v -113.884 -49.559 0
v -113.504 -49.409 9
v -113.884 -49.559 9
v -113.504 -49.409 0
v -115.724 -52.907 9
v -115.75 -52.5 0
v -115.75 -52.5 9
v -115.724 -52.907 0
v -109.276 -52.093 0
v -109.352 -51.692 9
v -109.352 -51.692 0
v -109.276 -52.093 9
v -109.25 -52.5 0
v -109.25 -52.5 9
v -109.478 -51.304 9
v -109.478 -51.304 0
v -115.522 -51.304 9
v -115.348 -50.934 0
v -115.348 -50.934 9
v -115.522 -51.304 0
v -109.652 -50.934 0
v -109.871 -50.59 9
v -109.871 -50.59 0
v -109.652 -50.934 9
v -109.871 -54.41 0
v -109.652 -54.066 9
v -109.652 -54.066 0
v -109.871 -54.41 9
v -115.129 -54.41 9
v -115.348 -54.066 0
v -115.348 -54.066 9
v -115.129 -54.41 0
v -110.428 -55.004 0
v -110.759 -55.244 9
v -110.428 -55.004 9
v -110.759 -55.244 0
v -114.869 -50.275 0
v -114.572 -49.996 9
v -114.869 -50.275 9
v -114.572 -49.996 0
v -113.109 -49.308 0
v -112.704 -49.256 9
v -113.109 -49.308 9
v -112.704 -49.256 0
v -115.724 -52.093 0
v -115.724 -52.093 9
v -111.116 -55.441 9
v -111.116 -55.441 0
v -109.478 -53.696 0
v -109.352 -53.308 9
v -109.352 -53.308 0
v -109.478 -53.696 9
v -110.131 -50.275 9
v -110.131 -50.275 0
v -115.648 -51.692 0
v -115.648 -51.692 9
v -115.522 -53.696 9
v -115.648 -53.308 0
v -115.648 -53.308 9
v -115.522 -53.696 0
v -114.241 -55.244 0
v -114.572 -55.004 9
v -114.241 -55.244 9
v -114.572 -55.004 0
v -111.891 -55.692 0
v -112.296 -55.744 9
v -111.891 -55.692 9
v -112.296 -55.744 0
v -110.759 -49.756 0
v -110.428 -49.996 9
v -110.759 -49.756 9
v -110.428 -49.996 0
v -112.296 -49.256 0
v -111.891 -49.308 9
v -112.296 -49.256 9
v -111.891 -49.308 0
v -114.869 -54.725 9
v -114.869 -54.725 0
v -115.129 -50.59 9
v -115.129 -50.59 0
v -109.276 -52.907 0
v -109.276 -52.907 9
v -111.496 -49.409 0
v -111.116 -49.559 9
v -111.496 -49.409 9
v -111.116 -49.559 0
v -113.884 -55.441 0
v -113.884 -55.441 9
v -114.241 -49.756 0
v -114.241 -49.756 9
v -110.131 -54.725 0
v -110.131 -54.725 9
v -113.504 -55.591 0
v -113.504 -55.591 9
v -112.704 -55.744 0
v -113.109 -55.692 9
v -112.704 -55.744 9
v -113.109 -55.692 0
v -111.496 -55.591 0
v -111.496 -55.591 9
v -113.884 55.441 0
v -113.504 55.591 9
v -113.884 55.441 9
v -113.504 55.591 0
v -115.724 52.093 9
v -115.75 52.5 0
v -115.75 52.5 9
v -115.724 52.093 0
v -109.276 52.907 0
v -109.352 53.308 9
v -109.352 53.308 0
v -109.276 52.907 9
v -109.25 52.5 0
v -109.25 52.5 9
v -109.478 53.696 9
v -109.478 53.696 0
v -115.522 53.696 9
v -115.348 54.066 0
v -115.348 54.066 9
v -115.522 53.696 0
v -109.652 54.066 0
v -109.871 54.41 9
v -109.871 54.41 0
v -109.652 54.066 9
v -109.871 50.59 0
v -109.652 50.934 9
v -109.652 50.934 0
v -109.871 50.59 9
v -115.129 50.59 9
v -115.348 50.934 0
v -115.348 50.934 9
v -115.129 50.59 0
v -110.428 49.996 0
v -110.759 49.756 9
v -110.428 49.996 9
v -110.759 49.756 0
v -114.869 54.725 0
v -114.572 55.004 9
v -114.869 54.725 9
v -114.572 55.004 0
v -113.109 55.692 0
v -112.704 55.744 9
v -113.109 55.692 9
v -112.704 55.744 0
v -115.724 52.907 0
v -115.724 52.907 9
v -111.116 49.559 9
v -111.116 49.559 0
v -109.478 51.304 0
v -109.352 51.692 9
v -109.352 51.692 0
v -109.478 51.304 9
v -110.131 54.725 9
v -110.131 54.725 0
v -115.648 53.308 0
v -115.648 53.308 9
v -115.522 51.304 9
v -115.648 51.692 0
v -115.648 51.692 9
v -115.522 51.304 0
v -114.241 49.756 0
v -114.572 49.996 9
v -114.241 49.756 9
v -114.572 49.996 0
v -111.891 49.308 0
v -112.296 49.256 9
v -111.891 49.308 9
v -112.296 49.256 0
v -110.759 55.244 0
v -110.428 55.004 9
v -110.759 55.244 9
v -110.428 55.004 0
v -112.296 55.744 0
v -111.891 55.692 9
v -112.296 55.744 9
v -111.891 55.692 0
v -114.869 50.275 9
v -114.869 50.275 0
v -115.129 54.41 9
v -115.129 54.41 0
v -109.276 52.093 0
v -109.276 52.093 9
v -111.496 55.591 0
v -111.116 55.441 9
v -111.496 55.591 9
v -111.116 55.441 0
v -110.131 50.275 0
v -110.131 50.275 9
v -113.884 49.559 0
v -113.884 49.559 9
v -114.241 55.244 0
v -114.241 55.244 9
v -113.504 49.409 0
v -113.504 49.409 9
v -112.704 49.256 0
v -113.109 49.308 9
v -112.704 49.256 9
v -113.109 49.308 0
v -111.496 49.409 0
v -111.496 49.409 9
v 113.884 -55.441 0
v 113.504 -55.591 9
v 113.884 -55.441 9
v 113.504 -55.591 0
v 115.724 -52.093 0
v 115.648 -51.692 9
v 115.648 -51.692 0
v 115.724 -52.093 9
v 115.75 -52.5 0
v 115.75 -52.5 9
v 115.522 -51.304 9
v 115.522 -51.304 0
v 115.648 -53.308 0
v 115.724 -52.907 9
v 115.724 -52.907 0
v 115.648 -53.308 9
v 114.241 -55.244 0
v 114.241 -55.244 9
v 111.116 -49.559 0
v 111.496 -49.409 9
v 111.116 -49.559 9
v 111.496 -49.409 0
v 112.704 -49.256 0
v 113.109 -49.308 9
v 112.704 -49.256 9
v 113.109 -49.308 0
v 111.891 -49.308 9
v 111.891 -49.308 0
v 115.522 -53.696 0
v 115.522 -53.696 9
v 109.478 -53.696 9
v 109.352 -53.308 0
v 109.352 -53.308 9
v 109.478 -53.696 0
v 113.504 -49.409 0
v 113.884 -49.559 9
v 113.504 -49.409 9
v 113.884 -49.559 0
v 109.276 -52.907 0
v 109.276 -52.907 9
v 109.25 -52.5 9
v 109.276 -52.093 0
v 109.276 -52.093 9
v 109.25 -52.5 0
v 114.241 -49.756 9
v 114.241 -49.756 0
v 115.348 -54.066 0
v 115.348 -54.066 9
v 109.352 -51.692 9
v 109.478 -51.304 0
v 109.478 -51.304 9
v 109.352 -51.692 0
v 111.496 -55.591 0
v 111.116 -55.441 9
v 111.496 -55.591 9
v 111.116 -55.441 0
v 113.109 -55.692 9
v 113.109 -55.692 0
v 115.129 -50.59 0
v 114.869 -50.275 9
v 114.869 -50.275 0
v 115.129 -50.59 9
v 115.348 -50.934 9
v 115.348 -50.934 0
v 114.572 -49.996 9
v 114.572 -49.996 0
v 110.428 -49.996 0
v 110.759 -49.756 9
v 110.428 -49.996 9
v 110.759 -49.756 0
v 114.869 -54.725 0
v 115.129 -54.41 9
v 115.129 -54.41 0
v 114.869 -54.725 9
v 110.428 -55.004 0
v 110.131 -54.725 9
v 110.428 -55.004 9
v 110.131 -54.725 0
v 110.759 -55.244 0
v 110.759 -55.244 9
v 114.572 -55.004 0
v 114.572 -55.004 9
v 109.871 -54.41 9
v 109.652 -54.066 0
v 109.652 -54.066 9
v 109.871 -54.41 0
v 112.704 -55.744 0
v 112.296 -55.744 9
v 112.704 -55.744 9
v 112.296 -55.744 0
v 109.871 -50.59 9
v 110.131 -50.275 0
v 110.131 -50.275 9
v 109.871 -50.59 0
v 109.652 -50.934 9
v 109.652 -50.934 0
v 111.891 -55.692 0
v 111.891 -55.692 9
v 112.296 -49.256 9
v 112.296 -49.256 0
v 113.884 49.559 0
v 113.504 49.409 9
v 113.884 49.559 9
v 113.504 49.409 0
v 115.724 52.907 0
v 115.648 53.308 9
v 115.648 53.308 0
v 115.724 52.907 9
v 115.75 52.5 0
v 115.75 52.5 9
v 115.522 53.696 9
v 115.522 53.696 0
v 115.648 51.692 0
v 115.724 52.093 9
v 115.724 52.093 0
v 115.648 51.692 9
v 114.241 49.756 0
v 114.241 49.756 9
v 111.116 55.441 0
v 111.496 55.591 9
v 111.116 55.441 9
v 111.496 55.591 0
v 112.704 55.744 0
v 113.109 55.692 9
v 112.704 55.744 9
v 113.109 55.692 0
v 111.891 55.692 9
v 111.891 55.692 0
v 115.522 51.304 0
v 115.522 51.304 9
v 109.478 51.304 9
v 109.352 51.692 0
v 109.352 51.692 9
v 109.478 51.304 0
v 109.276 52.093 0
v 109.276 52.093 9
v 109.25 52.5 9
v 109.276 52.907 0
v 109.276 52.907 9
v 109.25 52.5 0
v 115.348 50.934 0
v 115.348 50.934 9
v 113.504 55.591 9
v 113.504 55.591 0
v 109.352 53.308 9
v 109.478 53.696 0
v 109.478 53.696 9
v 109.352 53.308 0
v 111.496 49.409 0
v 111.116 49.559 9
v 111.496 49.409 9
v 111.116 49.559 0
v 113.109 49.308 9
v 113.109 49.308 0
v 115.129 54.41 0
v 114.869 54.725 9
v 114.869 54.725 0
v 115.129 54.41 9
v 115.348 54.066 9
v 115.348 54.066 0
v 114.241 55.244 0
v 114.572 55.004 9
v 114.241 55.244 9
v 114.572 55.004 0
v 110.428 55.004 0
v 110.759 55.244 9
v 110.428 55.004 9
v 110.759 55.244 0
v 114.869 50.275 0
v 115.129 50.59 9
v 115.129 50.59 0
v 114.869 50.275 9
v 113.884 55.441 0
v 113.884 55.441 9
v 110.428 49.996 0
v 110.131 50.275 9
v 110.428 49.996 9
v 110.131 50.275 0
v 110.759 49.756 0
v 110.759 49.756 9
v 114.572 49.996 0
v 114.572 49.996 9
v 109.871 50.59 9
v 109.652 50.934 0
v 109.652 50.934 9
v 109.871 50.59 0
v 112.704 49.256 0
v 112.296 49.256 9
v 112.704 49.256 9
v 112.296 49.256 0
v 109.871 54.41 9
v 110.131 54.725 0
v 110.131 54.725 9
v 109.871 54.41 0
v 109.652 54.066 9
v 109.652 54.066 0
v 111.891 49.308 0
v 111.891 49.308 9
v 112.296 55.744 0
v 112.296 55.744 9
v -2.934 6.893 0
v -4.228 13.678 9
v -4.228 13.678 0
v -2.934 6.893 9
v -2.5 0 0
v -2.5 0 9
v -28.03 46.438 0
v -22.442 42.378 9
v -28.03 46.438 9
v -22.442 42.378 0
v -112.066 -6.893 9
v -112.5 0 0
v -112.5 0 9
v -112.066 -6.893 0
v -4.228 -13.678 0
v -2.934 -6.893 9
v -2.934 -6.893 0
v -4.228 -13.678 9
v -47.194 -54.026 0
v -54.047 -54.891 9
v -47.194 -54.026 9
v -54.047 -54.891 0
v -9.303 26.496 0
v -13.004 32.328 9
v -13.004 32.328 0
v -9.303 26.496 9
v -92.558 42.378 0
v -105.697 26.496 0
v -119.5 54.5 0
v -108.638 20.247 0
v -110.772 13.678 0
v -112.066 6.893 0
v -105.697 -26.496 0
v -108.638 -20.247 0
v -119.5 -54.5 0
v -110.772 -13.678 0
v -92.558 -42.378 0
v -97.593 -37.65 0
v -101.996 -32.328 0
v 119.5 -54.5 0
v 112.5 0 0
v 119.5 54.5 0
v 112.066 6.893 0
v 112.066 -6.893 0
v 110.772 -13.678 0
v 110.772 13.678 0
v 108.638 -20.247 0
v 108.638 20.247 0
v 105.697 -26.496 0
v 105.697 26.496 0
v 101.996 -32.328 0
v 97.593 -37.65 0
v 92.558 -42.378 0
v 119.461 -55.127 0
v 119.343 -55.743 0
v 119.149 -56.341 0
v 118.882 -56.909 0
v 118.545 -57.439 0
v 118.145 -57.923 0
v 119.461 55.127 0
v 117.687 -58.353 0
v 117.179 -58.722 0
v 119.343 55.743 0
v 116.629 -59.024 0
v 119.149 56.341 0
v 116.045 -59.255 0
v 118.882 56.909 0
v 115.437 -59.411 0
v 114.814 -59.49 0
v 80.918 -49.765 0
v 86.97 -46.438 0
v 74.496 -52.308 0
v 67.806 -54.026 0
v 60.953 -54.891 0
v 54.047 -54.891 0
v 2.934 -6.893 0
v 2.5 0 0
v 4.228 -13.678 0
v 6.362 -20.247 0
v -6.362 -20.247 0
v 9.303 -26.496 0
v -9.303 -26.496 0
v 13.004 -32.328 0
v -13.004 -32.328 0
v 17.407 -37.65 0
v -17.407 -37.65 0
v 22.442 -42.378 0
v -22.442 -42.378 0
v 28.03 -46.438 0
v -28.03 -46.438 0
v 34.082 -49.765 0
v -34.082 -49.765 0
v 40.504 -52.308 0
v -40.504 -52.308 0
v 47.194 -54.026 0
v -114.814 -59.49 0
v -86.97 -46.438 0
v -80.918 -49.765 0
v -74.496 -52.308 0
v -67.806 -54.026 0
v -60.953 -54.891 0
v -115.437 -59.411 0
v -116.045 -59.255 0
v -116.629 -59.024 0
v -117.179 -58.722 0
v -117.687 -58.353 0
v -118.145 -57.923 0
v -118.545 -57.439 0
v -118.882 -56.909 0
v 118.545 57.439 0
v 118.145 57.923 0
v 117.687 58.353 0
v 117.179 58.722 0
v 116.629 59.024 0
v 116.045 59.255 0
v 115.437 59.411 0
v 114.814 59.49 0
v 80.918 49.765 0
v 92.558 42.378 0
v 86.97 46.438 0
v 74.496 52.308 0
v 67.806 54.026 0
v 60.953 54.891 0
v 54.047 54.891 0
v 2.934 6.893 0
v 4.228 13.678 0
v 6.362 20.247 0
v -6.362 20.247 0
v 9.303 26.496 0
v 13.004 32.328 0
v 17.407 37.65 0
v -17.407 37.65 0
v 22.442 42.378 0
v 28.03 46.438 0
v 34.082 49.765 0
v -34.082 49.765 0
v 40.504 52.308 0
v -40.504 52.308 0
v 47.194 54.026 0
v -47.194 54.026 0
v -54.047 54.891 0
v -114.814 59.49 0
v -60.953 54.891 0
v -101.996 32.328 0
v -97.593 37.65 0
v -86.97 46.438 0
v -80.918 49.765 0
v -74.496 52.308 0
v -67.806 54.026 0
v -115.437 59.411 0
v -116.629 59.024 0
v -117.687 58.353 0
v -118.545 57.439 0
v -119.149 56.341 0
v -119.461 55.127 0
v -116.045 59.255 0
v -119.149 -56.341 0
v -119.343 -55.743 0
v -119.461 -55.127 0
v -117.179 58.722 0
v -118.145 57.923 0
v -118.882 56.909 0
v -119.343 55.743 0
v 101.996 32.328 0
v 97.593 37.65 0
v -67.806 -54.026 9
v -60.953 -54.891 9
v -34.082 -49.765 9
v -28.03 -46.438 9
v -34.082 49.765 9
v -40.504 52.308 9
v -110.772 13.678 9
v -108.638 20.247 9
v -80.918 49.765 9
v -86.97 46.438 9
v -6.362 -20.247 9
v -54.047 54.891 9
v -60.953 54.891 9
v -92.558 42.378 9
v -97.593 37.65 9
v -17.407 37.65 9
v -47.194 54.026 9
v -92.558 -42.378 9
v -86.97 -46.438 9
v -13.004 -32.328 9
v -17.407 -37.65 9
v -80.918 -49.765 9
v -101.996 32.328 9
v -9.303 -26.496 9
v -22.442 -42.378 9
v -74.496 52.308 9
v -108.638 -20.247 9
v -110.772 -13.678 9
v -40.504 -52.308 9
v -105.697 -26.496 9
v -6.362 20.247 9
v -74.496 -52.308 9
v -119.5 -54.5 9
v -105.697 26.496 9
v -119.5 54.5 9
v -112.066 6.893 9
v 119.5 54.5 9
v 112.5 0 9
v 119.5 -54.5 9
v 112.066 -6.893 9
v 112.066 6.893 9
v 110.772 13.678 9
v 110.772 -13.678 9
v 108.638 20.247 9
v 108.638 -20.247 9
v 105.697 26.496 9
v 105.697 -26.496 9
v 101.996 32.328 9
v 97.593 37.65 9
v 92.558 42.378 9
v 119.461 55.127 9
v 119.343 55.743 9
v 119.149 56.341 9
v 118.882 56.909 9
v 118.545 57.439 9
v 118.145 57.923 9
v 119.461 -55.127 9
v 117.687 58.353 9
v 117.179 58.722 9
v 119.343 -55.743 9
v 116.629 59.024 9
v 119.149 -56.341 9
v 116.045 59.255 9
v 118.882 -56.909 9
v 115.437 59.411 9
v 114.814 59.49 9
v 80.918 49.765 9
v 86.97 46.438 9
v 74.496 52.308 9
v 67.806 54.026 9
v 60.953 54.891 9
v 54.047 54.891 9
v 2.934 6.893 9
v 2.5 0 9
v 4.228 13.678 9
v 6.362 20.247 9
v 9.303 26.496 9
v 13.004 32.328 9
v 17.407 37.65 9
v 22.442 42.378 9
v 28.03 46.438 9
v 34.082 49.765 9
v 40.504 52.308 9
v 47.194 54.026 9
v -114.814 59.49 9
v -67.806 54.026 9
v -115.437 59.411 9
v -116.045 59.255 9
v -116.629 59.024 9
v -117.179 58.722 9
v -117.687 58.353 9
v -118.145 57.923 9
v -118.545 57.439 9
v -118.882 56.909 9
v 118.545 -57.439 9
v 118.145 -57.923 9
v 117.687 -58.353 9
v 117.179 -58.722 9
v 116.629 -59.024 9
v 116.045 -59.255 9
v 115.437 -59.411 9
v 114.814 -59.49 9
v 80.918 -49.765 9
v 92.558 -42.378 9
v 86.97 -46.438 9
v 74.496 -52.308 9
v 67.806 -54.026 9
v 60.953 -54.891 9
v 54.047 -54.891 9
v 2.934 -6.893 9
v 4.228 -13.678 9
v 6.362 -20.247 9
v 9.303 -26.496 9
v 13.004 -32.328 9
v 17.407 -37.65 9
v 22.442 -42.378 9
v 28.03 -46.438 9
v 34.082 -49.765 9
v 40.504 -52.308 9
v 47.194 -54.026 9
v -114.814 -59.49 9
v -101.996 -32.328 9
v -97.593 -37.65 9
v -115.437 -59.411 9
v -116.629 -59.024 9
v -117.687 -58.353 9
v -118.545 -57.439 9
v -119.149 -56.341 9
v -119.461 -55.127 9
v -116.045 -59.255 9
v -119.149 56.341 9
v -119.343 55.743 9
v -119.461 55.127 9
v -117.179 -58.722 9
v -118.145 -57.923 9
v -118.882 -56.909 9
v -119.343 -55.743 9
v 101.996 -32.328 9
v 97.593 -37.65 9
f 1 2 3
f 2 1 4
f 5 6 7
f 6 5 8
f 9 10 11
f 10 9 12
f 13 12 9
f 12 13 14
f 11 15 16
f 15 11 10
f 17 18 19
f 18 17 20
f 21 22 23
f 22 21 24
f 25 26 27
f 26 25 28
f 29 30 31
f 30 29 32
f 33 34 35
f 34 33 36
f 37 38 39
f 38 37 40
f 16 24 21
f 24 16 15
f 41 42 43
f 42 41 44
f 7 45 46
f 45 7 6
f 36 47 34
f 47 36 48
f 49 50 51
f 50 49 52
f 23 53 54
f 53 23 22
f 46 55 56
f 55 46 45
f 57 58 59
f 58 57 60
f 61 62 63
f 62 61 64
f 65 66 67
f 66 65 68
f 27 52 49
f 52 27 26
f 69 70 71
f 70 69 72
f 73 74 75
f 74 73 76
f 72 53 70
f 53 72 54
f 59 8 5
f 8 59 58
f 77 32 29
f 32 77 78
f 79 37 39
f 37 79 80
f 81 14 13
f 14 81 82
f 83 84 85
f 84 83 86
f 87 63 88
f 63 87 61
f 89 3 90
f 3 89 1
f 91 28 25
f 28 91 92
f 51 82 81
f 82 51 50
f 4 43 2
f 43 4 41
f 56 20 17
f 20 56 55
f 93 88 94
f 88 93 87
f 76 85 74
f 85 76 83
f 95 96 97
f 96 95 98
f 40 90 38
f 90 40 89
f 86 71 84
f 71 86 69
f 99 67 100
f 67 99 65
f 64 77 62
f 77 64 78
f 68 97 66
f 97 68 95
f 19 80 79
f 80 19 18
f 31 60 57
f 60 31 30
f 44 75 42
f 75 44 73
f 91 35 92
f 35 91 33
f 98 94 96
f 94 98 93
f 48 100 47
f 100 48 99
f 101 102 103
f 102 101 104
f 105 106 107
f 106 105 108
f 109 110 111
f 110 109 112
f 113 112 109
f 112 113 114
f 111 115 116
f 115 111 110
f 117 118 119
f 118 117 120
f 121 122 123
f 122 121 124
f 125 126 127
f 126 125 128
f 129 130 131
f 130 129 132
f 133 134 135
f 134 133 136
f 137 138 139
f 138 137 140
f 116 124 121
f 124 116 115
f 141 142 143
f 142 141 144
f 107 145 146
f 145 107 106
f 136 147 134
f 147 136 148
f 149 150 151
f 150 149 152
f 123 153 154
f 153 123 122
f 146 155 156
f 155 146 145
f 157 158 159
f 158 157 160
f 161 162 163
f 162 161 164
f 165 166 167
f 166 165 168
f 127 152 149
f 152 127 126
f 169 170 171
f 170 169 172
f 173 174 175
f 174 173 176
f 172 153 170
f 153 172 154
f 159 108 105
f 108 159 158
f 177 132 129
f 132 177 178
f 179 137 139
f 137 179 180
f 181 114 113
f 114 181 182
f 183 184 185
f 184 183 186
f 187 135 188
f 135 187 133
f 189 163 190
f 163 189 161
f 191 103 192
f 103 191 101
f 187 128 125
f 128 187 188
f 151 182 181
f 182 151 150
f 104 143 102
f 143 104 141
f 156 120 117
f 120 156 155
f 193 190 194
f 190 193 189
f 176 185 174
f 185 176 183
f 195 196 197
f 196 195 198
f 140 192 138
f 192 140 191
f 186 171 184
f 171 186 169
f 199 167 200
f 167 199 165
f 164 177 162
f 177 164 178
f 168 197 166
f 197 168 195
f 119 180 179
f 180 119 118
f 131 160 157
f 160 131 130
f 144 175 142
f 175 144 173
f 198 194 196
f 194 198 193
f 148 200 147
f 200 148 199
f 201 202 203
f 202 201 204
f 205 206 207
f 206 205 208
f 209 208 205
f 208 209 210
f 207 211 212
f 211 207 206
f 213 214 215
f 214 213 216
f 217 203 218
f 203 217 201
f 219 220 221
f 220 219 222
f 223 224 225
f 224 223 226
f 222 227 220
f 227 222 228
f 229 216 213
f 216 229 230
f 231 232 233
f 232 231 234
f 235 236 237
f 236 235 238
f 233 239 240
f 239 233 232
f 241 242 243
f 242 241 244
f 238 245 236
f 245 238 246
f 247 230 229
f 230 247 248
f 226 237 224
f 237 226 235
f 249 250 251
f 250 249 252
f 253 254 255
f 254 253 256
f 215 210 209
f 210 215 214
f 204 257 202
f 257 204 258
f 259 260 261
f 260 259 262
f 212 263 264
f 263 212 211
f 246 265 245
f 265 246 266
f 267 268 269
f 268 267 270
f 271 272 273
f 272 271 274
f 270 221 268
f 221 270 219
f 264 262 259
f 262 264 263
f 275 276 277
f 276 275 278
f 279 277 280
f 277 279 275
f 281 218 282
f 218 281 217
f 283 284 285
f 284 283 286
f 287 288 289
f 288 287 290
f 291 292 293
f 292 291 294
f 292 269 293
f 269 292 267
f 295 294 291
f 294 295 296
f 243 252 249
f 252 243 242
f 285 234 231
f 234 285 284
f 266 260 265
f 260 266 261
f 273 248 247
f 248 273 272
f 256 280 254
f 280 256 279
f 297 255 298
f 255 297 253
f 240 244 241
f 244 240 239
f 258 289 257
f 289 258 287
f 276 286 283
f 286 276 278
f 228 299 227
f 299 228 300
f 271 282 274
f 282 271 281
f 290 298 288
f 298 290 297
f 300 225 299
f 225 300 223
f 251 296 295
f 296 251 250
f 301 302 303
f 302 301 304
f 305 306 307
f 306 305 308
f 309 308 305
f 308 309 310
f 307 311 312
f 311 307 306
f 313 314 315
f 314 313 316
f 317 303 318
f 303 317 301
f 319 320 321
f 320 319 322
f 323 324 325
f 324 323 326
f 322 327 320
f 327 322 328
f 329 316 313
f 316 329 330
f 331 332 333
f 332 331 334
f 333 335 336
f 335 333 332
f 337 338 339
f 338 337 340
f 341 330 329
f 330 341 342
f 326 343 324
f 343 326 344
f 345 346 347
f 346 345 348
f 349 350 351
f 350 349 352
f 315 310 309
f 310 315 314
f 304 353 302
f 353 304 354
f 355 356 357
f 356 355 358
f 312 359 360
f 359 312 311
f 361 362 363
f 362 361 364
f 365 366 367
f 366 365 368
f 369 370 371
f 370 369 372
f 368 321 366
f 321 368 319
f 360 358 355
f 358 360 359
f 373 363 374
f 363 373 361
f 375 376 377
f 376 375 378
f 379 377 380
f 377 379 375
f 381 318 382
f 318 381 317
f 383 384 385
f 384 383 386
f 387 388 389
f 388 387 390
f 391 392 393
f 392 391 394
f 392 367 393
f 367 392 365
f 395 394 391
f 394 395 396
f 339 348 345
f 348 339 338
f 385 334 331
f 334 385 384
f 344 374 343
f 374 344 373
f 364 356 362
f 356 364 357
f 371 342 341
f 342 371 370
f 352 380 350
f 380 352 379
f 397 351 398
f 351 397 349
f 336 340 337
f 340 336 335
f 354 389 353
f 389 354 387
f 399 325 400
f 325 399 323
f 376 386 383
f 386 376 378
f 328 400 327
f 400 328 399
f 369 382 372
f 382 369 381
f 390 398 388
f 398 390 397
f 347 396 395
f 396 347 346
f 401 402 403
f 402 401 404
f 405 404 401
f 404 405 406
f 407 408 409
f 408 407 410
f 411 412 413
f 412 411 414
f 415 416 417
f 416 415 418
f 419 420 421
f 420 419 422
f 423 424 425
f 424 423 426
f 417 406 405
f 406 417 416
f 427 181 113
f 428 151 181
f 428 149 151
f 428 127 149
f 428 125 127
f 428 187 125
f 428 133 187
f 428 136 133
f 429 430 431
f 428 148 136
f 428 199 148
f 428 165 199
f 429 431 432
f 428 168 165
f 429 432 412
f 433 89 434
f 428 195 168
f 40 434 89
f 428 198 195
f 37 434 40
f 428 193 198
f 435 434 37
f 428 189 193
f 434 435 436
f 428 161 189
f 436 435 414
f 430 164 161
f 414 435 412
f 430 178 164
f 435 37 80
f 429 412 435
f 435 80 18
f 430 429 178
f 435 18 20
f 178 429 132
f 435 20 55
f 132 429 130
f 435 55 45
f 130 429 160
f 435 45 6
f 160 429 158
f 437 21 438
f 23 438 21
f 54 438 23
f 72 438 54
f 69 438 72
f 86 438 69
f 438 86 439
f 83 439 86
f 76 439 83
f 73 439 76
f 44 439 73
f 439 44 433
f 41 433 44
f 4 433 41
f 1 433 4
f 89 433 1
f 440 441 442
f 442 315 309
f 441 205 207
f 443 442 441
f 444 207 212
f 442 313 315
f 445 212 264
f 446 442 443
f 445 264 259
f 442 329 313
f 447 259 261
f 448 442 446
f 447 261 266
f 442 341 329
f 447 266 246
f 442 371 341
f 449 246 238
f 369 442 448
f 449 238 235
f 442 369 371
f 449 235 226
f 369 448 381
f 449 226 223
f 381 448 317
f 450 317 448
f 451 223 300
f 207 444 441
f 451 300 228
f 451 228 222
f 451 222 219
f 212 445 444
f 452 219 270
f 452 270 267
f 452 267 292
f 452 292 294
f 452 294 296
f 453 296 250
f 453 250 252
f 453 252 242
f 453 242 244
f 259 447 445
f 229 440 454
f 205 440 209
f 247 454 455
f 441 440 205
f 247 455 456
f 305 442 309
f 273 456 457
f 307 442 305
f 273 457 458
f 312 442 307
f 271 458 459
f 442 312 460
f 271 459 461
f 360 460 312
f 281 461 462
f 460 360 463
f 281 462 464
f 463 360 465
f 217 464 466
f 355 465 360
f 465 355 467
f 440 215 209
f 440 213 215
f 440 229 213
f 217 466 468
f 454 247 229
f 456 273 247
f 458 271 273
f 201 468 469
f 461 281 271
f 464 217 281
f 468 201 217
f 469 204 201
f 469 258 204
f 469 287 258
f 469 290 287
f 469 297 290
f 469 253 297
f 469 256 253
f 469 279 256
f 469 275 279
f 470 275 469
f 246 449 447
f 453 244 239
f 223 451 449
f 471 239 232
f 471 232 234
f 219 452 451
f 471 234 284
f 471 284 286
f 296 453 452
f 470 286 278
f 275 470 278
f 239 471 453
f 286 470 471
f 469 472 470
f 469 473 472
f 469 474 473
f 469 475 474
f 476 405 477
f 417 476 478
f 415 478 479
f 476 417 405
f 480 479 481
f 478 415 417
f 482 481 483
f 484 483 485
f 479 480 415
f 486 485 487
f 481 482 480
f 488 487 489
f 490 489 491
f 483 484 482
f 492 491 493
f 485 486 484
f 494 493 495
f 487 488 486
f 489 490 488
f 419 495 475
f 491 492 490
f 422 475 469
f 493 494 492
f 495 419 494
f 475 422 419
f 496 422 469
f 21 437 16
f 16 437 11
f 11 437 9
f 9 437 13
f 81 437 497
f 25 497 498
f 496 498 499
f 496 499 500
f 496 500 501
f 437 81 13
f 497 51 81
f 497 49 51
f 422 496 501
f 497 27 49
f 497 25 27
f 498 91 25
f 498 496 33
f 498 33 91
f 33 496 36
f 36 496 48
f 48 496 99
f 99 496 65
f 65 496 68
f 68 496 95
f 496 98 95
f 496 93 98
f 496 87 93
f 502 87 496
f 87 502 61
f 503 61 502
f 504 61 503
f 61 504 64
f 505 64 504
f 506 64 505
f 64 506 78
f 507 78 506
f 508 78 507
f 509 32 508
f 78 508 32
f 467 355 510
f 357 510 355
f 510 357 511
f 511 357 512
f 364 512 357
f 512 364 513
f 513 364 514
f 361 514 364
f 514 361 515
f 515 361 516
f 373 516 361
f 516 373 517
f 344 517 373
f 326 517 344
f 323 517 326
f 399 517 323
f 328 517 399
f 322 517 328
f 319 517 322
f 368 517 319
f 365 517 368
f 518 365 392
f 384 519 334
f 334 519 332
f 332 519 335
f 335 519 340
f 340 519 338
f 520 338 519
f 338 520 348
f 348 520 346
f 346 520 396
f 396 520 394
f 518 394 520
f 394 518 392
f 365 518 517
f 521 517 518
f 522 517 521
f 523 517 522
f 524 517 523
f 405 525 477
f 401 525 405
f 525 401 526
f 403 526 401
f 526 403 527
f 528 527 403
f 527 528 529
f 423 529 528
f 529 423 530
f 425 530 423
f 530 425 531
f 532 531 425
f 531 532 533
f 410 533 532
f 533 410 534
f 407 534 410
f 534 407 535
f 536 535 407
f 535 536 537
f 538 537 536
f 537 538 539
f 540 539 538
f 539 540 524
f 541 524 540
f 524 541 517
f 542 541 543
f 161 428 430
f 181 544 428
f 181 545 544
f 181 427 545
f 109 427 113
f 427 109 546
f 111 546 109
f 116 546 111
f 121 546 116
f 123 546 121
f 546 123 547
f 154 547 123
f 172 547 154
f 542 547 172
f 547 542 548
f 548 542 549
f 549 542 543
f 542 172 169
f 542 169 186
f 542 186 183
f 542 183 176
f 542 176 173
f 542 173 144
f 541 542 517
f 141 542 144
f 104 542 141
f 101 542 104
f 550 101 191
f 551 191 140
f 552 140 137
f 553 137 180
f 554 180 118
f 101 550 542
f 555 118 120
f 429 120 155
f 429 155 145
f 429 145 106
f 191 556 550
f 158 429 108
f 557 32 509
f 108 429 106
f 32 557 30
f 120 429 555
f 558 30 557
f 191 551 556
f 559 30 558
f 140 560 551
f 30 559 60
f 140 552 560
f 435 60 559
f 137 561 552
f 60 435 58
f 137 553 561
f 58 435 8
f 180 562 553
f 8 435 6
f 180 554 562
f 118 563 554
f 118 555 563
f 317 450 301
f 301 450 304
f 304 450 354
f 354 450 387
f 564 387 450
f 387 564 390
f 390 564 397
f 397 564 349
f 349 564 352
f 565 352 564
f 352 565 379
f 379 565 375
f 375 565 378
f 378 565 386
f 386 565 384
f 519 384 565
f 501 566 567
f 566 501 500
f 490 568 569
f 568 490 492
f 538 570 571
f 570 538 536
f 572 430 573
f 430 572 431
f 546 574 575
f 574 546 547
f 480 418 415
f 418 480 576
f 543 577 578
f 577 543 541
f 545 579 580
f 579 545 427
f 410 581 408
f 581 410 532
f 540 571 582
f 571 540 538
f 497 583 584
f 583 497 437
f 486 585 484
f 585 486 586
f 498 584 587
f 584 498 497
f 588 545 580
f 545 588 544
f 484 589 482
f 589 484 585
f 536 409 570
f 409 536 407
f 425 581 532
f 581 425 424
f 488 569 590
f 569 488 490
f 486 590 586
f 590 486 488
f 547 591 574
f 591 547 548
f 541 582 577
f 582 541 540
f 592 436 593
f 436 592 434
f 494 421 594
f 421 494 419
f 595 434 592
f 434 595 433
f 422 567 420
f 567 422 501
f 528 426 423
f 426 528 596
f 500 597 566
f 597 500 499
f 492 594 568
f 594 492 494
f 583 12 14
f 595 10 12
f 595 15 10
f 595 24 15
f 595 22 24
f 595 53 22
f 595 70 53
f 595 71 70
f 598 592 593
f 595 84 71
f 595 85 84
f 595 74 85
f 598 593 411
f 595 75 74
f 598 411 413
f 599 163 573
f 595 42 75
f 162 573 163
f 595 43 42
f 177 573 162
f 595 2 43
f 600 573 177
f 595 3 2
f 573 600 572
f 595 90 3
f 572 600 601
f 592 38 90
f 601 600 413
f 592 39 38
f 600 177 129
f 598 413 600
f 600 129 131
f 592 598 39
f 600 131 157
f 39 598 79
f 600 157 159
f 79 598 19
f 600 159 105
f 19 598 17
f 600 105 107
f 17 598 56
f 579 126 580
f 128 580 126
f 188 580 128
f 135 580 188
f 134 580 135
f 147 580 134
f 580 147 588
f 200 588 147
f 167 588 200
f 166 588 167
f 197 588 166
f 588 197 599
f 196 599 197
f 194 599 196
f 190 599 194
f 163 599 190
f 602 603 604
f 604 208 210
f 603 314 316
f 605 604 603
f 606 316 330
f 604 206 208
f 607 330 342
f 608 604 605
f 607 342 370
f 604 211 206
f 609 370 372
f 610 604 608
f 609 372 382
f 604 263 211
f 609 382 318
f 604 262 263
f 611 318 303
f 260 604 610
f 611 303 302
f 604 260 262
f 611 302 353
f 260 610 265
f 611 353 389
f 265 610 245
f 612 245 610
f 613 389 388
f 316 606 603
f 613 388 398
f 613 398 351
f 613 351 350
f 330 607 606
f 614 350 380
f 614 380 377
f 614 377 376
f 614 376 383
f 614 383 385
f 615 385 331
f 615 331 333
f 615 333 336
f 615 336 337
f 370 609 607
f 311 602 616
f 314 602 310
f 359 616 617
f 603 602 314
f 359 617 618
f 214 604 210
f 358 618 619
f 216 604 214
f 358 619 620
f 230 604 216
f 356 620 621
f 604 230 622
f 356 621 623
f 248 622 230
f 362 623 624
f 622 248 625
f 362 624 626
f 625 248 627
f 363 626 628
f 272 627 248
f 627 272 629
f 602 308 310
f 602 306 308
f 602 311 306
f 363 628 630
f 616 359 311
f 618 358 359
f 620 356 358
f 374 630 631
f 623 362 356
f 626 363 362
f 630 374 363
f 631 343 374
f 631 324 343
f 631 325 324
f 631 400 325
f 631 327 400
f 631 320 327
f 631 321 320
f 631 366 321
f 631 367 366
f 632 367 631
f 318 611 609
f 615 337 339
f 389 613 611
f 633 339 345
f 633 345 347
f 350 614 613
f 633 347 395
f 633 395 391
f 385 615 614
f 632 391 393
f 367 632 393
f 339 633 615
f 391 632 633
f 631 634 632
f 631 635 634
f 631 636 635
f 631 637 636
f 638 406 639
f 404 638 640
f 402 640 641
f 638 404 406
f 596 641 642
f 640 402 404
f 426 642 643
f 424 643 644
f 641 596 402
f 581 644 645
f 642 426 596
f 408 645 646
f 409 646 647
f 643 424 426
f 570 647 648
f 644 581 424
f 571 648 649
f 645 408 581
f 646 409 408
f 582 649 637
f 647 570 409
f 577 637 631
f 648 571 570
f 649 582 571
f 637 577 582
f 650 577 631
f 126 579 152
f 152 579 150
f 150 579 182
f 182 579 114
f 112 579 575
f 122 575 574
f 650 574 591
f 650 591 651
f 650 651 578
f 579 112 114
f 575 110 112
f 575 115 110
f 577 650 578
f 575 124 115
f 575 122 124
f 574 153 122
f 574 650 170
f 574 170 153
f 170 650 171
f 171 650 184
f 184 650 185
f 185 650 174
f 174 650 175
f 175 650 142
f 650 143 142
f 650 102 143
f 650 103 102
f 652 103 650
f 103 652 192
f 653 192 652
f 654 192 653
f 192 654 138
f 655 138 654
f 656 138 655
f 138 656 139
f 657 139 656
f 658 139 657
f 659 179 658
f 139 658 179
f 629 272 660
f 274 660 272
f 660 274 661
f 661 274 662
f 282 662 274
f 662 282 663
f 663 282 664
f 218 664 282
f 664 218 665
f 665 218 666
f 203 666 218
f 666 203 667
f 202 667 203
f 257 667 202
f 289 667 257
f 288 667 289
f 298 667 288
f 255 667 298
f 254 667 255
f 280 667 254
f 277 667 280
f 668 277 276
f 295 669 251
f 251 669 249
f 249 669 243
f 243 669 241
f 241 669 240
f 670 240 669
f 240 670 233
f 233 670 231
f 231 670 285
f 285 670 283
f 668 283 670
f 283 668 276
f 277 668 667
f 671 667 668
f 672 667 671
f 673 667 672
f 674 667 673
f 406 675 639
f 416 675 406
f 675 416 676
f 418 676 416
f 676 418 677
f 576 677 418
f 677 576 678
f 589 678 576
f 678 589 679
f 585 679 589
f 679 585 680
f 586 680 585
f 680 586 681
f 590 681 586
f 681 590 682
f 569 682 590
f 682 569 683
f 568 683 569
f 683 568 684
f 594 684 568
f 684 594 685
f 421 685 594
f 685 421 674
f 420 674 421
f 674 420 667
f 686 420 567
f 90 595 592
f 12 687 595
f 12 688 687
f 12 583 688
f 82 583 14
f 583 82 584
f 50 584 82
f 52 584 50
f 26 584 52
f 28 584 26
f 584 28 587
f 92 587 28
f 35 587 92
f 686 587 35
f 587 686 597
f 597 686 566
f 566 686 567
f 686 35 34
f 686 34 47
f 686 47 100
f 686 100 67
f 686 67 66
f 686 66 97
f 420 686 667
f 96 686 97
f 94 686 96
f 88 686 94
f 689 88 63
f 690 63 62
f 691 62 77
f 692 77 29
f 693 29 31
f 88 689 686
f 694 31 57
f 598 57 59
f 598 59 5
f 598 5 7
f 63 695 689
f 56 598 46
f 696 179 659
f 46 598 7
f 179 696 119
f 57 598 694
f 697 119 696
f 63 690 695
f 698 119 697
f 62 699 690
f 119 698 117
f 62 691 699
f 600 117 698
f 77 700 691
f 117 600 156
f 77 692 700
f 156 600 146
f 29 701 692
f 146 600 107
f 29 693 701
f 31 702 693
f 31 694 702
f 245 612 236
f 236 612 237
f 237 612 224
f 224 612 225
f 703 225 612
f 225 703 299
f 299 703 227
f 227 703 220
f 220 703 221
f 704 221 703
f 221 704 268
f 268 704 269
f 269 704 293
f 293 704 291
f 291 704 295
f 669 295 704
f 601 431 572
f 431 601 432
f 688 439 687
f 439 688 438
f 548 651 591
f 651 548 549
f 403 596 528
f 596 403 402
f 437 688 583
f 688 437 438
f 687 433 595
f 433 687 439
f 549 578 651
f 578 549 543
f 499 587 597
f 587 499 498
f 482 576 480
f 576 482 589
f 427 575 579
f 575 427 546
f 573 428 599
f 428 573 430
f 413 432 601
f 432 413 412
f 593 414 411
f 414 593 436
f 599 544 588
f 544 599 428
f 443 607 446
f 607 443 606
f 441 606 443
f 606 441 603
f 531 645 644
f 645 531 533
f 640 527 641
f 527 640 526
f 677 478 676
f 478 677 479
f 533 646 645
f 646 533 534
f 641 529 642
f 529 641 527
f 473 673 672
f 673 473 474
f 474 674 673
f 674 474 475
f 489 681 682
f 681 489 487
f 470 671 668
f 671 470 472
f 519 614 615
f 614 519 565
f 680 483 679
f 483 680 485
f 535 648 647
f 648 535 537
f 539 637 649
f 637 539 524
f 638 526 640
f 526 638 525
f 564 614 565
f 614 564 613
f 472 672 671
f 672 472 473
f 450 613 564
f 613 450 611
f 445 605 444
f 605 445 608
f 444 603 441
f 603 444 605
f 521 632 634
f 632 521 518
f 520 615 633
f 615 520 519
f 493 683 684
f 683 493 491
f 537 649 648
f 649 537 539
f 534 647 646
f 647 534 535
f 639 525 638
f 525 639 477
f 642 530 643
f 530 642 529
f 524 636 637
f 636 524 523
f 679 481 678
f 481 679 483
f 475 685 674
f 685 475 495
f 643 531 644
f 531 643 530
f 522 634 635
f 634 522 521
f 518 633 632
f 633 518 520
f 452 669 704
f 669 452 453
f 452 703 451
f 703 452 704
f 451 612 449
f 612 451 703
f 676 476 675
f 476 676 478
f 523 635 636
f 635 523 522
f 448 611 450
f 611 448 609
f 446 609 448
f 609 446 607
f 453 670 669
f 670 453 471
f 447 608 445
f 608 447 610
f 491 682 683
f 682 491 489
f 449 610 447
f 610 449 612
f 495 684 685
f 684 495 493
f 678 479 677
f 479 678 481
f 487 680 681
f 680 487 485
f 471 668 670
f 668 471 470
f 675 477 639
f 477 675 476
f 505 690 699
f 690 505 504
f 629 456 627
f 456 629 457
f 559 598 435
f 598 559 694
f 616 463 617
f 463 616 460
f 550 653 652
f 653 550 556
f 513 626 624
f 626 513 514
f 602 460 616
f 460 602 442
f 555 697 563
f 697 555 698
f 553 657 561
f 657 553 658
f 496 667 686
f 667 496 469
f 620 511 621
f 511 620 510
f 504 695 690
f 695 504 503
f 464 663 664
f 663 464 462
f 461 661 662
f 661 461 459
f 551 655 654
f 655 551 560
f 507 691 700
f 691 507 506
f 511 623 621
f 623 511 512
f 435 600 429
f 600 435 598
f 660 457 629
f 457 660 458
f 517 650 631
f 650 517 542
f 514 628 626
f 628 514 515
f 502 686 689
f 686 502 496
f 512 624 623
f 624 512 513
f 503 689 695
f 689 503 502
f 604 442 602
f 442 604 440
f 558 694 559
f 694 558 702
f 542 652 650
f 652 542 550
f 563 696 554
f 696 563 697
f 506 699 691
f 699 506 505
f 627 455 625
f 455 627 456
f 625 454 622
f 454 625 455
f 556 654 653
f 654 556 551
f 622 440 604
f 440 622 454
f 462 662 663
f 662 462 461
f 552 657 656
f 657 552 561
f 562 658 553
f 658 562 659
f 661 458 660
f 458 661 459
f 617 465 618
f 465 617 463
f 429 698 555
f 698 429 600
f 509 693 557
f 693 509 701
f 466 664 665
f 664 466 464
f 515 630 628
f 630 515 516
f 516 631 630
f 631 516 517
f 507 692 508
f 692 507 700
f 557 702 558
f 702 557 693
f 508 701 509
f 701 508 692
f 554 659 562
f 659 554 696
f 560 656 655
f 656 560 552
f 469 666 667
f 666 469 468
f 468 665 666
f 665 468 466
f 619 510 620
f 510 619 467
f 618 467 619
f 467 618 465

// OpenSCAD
$fn = 50;

difference() {
	union() {
		hull() {
			translate(v = [-114.5, 54.5, 0]) {
				cylinder(h = 9, r = 5);
			}
			translate(v = [114.5, 54.5, 0]) {
				cylinder(h = 9, r = 5);
			}
			translate(v = [-114.5, -54.5, 0]) {
				cylinder(h = 9, r = 5);
			}
			translate(v = [114.5, -54.5, 0]) {
				cylinder(h = 9, r = 5);
			}
		}
	}
	union() {
		translate(v = [-112.5, -52.5, -100.0]) {
			cylinder(h = 200, r = 3.25);
		}
		translate(v = [-112.5, 52.5, -100.0]) {
			cylinder(h = 200, r = 3.25);
		}
		translate(v = [112.5, -52.5, -100.0]) {
			cylinder(h = 200, r = 3.25);
		}
		translate(v = [112.5, 52.5, -100.0]) {
			cylinder(h = 200, r = 3.25);
		}
		translate(v = [-112.5, -52.5, -100.0]) {
			cylinder(h = 200, r = 1.8);
		}
		translate(v = [-112.5, 52.5, -100.0]) {
			cylinder(h = 200, r = 1.8);
		}
		translate(v = [112.5, -52.5, -100.0]) {
			cylinder(h = 200, r = 1.8);
		}
		translate(v = [112.5, 52.5, -100.0]) {
			cylinder(h = 200, r = 1.8);
		}
		translate(v = [-57.5, 0, 0.0]) {
			cylinder(h = 9, r = 55.0);
		}
		translate(v = [57.5, 0, 0.0]) {
			cylinder(h = 9, r = 55.0);
		}
	}
}
